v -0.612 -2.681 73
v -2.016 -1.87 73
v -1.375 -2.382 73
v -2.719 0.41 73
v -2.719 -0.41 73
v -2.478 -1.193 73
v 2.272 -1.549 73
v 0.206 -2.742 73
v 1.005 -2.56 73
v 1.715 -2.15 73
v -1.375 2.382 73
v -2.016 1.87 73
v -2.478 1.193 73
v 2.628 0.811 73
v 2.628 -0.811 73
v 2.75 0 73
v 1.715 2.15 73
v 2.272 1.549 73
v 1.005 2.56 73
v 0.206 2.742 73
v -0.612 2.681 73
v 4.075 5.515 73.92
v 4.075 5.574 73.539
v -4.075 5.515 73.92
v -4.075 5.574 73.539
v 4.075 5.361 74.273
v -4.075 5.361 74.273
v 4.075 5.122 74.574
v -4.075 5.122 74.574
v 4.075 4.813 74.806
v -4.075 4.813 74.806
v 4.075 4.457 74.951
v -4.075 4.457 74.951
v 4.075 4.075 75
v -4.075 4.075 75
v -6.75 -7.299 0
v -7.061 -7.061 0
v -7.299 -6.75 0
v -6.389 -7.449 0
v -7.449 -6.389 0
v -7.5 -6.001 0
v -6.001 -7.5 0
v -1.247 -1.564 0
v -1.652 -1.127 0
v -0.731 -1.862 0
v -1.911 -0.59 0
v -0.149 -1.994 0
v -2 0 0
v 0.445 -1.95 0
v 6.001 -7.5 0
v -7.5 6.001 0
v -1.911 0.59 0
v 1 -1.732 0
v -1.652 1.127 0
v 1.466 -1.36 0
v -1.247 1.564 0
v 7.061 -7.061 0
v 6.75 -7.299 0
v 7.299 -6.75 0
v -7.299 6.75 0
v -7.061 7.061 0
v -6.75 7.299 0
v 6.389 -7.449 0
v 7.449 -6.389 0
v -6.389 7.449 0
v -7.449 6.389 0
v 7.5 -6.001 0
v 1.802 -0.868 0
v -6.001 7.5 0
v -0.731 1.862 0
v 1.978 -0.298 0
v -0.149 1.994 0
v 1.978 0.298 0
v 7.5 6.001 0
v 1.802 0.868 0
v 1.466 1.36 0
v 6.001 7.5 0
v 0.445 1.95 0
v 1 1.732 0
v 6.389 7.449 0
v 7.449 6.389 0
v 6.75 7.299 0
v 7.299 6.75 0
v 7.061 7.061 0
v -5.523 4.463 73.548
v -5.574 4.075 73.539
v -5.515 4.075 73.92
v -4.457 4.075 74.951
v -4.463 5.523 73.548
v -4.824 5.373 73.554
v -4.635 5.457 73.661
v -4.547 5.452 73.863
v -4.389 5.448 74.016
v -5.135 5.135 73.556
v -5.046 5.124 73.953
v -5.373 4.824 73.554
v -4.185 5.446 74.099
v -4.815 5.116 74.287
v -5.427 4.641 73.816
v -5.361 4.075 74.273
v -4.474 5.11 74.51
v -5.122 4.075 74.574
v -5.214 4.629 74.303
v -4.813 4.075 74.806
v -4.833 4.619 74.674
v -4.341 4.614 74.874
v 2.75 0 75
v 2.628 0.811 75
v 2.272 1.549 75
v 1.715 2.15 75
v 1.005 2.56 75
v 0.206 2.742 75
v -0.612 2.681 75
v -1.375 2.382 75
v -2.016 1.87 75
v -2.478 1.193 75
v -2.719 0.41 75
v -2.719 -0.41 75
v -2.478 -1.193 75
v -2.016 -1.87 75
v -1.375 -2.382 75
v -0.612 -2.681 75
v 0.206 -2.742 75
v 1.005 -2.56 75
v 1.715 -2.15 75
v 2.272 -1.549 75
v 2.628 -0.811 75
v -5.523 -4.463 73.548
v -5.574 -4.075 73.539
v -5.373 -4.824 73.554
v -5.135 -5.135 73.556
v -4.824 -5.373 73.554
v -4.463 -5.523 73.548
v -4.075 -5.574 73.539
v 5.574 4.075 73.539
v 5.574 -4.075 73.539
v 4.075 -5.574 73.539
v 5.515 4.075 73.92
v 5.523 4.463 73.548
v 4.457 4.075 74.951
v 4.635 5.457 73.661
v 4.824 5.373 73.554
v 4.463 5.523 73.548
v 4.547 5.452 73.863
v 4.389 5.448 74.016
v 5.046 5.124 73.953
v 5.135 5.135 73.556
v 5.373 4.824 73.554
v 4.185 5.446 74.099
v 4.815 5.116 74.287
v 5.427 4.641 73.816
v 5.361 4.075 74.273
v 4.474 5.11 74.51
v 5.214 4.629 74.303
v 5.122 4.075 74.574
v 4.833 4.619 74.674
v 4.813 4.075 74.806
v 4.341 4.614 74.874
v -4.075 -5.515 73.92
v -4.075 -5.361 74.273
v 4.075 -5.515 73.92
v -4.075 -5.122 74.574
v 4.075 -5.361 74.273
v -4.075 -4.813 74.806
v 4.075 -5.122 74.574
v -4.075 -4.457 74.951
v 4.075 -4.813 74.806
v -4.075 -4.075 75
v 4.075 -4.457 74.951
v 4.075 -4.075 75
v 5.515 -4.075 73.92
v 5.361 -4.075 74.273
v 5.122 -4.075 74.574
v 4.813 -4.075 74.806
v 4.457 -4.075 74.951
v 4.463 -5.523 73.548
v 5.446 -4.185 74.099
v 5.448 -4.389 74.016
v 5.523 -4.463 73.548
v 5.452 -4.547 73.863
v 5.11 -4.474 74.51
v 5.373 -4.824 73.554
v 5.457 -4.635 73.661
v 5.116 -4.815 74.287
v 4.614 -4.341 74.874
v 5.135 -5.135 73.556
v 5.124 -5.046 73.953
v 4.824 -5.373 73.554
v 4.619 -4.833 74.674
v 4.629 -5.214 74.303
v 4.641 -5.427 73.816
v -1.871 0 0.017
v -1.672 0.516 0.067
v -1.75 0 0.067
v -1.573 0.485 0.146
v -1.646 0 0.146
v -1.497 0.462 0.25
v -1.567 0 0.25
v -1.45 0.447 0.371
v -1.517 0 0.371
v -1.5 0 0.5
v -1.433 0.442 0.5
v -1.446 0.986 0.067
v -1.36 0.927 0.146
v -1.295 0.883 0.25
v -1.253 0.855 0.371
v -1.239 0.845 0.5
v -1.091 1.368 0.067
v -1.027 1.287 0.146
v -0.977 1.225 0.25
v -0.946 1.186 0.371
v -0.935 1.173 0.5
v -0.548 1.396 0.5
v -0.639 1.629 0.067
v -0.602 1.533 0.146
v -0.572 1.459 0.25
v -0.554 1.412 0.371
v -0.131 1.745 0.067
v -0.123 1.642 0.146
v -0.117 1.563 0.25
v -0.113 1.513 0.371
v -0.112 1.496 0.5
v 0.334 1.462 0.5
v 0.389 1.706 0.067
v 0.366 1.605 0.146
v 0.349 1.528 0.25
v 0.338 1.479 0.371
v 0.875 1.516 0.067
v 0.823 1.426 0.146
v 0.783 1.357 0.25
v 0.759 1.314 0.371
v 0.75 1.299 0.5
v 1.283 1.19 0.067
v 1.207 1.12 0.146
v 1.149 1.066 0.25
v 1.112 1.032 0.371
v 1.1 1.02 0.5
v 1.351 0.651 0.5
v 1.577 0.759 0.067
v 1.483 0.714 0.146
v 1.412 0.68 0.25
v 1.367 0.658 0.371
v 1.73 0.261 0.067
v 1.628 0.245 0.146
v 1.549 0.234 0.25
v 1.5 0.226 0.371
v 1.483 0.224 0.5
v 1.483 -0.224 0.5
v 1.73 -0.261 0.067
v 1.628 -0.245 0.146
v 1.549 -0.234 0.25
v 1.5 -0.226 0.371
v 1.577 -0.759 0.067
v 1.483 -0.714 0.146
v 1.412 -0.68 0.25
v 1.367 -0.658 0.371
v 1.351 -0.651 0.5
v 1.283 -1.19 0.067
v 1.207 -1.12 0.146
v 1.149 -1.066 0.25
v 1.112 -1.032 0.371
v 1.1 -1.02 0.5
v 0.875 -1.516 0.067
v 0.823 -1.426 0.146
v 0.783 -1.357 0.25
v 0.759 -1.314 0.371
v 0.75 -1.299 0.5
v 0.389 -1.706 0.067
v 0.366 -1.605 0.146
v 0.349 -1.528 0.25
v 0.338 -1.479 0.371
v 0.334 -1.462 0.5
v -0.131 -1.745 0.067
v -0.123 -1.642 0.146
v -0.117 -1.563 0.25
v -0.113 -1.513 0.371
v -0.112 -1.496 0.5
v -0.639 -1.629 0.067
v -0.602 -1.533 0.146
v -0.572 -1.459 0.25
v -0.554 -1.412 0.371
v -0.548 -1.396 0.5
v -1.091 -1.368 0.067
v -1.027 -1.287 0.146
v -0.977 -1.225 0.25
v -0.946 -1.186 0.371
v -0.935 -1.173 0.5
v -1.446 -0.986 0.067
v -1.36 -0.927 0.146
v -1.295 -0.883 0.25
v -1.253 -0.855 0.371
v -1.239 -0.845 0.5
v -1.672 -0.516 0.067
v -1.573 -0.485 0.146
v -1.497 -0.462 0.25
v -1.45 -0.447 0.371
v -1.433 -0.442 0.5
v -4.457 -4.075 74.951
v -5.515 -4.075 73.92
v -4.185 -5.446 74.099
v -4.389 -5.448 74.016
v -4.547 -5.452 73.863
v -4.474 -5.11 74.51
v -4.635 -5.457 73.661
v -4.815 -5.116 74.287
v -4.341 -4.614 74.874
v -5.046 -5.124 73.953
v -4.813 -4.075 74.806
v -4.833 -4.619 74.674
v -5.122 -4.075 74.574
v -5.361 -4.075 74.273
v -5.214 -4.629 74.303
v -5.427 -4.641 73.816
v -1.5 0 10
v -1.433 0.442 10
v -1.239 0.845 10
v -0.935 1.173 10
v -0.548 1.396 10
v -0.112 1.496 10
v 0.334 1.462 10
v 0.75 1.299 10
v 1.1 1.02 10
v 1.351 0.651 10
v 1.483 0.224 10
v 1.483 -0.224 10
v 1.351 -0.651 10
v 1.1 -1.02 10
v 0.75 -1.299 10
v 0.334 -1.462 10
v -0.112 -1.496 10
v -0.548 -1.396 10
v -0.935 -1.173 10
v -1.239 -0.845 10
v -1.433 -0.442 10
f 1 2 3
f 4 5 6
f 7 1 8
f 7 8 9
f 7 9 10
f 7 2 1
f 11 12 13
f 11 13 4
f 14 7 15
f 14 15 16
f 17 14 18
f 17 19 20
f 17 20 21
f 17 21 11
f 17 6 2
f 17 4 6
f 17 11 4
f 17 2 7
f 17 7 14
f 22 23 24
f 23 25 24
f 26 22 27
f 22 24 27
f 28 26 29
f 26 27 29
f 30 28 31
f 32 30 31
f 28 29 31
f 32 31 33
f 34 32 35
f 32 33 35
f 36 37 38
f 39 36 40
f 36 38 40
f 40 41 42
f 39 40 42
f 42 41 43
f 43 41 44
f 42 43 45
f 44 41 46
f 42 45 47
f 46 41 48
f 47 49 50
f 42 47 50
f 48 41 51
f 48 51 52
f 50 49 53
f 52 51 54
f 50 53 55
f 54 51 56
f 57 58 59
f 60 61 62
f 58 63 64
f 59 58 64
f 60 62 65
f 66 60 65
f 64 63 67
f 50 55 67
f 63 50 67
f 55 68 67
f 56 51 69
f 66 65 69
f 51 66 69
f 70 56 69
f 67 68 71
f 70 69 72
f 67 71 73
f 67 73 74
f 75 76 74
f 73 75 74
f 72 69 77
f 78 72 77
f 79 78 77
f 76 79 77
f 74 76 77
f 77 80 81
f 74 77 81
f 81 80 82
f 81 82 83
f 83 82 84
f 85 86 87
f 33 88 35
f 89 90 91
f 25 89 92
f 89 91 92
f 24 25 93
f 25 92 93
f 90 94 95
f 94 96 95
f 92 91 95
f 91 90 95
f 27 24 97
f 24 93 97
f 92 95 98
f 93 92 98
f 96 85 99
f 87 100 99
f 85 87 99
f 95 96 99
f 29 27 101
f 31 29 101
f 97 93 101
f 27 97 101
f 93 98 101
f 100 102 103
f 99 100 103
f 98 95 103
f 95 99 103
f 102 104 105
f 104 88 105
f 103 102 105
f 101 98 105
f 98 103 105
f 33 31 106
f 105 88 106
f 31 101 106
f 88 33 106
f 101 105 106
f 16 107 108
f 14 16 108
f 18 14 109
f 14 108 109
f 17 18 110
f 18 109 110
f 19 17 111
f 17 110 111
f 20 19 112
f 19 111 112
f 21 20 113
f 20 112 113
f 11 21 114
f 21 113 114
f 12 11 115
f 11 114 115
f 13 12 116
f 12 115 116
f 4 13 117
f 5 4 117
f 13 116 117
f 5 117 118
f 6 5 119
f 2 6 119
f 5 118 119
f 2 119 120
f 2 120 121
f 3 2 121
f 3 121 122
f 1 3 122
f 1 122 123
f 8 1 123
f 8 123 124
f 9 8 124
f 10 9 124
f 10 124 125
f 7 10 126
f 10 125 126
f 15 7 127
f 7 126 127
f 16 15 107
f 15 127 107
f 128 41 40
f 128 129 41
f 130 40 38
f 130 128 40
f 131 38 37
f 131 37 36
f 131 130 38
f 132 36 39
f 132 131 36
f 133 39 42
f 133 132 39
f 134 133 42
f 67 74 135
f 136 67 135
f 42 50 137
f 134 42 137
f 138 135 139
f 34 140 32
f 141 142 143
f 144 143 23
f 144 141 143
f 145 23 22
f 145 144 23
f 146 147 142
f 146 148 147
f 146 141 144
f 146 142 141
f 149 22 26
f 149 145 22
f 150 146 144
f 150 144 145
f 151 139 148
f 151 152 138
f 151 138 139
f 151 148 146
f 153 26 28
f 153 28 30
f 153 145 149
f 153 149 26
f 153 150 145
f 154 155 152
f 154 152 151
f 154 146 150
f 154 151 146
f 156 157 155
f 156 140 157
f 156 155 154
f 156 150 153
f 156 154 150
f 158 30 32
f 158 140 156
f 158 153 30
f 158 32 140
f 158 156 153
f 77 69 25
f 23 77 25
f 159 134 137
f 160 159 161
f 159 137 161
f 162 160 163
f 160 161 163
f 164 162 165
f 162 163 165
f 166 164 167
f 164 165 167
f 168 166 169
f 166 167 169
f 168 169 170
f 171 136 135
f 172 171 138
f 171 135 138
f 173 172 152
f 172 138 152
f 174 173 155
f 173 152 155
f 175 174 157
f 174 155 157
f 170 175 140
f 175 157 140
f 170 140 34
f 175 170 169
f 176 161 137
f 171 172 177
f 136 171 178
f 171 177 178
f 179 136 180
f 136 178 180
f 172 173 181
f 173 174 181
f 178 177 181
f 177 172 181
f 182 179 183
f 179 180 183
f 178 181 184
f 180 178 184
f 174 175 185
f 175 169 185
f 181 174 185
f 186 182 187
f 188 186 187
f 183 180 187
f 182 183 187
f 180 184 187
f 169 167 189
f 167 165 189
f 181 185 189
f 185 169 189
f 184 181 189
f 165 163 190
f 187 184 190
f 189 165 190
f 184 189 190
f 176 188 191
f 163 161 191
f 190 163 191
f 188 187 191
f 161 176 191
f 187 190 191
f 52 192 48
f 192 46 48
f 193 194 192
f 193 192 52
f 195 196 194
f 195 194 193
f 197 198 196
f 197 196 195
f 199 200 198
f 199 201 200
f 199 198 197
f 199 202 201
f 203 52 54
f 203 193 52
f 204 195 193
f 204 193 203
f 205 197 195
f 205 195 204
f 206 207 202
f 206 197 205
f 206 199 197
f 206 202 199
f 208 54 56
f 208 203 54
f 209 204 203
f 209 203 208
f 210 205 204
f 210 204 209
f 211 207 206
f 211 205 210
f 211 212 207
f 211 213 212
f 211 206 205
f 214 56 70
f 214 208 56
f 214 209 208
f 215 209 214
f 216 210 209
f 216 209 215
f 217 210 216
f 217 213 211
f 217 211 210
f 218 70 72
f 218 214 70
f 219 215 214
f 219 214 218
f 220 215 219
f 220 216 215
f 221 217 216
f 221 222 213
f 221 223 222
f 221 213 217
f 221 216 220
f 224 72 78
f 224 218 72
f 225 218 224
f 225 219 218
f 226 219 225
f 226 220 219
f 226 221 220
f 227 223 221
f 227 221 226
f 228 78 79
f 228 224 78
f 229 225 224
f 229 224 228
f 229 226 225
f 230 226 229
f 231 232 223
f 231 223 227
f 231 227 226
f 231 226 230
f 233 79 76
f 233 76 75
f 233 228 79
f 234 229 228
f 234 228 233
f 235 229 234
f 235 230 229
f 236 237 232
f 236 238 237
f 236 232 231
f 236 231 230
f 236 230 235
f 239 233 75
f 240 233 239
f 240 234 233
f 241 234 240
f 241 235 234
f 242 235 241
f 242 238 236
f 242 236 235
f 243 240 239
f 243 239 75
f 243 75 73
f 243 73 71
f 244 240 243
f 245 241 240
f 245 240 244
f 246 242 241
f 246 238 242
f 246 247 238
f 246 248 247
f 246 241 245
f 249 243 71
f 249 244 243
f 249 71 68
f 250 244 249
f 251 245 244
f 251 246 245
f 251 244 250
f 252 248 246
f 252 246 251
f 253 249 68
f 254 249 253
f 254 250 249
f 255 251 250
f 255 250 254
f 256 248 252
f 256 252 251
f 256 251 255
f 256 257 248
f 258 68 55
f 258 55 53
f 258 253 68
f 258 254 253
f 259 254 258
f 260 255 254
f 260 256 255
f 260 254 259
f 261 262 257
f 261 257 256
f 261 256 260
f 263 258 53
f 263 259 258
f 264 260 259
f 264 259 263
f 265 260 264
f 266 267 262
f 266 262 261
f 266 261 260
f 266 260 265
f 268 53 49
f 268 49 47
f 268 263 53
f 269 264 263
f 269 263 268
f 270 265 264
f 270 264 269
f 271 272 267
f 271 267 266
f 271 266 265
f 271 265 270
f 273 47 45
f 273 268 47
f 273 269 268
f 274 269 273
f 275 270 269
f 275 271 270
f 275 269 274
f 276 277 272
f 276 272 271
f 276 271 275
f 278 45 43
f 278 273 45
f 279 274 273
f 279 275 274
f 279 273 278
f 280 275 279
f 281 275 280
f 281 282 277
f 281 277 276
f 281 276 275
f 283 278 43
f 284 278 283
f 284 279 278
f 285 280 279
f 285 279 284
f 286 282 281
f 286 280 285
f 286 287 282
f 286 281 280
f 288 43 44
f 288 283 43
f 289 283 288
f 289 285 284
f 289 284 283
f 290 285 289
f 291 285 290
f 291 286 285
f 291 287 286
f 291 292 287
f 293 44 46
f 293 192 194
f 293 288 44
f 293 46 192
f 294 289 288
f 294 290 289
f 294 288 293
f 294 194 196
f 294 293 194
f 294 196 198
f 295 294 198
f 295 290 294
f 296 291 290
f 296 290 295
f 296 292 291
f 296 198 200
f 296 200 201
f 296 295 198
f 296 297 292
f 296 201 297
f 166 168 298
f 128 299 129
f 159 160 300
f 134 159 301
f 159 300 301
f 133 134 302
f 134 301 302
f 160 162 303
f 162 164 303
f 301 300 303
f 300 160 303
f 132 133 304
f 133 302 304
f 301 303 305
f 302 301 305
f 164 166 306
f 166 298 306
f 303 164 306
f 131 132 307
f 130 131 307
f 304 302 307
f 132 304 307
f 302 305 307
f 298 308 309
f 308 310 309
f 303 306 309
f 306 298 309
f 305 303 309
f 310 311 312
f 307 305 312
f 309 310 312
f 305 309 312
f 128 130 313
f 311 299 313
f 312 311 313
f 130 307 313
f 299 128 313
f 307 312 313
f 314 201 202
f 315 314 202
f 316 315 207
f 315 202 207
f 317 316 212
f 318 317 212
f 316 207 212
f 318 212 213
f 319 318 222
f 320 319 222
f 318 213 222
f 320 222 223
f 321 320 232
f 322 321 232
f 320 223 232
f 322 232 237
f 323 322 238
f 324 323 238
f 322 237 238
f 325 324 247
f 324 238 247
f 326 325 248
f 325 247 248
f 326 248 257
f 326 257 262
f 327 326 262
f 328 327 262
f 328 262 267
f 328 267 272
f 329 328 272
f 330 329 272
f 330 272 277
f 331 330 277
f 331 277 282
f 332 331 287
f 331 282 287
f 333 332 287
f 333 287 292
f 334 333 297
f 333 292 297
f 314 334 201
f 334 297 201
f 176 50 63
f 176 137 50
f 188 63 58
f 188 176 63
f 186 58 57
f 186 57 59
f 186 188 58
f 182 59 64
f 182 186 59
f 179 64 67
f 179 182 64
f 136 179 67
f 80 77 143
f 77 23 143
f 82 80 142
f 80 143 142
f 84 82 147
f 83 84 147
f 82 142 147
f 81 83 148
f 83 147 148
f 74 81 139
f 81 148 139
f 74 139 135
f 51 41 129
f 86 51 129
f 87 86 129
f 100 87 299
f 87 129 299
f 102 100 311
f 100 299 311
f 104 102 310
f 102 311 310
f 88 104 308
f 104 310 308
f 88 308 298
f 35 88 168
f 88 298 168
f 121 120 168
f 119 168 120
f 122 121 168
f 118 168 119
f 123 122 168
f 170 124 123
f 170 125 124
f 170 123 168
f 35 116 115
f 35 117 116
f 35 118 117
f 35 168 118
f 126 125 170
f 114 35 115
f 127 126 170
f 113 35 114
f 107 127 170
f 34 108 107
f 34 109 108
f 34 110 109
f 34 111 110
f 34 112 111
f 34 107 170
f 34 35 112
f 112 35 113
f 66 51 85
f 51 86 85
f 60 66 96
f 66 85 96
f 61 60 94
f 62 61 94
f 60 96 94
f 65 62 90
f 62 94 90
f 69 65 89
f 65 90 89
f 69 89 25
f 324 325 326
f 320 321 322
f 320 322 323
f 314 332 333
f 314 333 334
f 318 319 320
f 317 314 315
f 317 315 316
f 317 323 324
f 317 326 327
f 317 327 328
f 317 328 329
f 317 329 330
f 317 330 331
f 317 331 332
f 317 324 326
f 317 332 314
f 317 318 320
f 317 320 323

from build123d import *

# Parameters (mm, degrees)
SKETCH1_W           = 15
SKETCH1_H           = 15
BOSS_EXTRUDE1_DEPTH = 75
BOSS_EXTRUDE1_TAPER = 1.5
SKETCH2_R           = 1.5
CUT_EXTRUDE1_DEPTH  = 10
SKETCH3_R           = 2.75
CUT_EXTRUDE2_DEPTH  = 2
FILLET1_R           = 1.5
FILLET2_R           = 0.5


with BuildPart() as part:
    # Sketch1 → Boss-Extrude1 (new body)
    with BuildSketch(Plane.XY):
        Rectangle(SKETCH1_W, SKETCH1_H)
    extrude(amount=BOSS_EXTRUDE1_DEPTH, taper=BOSS_EXTRUDE1_TAPER)

    # Sketch2 → Cut-Extrude1 (cut)
    with BuildSketch(Plane(origin=(0, 0, 0), x_dir=(-1, 0, 0), z_dir=(0, 0, -1))):
        Circle(SKETCH2_R)
    extrude(amount=-CUT_EXTRUDE1_DEPTH, mode=Mode.SUBTRACT)

    # Sketch3 → Cut-Extrude2 (cut)
    with BuildSketch(Plane.XY.offset(75)):
        Circle(SKETCH3_R)
    extrude(amount=-CUT_EXTRUDE2_DEPTH, mode=Mode.SUBTRACT)

    # Fillet1
    fillet1_edges = [part.edges().sort_by_distance(p)[0] for p in [
        (-5.536055882, 0, 75),
        (0, -5.536055882, 75),
        (5.536055882, 0, 75),
        (6.518027941, -6.518027941, 37.5),
        (-6.518027941, -6.518027941, 37.5),
        (-6.518027479, 6.518027479, 37.500017641),
        (6.518027941, 6.518027941, 37.5),
        (0, 5.536055882, 75),
    ]]
    fillet(fillet1_edges, radius=FILLET1_R)

    # Fillet2
    fillet2_edges = [part.edges().sort_by_distance(p)[0] for p in [
        (1.5, 0, 0),
    ]]
    fillet(fillet2_edges, radius=FILLET2_R)


solid = part.part
